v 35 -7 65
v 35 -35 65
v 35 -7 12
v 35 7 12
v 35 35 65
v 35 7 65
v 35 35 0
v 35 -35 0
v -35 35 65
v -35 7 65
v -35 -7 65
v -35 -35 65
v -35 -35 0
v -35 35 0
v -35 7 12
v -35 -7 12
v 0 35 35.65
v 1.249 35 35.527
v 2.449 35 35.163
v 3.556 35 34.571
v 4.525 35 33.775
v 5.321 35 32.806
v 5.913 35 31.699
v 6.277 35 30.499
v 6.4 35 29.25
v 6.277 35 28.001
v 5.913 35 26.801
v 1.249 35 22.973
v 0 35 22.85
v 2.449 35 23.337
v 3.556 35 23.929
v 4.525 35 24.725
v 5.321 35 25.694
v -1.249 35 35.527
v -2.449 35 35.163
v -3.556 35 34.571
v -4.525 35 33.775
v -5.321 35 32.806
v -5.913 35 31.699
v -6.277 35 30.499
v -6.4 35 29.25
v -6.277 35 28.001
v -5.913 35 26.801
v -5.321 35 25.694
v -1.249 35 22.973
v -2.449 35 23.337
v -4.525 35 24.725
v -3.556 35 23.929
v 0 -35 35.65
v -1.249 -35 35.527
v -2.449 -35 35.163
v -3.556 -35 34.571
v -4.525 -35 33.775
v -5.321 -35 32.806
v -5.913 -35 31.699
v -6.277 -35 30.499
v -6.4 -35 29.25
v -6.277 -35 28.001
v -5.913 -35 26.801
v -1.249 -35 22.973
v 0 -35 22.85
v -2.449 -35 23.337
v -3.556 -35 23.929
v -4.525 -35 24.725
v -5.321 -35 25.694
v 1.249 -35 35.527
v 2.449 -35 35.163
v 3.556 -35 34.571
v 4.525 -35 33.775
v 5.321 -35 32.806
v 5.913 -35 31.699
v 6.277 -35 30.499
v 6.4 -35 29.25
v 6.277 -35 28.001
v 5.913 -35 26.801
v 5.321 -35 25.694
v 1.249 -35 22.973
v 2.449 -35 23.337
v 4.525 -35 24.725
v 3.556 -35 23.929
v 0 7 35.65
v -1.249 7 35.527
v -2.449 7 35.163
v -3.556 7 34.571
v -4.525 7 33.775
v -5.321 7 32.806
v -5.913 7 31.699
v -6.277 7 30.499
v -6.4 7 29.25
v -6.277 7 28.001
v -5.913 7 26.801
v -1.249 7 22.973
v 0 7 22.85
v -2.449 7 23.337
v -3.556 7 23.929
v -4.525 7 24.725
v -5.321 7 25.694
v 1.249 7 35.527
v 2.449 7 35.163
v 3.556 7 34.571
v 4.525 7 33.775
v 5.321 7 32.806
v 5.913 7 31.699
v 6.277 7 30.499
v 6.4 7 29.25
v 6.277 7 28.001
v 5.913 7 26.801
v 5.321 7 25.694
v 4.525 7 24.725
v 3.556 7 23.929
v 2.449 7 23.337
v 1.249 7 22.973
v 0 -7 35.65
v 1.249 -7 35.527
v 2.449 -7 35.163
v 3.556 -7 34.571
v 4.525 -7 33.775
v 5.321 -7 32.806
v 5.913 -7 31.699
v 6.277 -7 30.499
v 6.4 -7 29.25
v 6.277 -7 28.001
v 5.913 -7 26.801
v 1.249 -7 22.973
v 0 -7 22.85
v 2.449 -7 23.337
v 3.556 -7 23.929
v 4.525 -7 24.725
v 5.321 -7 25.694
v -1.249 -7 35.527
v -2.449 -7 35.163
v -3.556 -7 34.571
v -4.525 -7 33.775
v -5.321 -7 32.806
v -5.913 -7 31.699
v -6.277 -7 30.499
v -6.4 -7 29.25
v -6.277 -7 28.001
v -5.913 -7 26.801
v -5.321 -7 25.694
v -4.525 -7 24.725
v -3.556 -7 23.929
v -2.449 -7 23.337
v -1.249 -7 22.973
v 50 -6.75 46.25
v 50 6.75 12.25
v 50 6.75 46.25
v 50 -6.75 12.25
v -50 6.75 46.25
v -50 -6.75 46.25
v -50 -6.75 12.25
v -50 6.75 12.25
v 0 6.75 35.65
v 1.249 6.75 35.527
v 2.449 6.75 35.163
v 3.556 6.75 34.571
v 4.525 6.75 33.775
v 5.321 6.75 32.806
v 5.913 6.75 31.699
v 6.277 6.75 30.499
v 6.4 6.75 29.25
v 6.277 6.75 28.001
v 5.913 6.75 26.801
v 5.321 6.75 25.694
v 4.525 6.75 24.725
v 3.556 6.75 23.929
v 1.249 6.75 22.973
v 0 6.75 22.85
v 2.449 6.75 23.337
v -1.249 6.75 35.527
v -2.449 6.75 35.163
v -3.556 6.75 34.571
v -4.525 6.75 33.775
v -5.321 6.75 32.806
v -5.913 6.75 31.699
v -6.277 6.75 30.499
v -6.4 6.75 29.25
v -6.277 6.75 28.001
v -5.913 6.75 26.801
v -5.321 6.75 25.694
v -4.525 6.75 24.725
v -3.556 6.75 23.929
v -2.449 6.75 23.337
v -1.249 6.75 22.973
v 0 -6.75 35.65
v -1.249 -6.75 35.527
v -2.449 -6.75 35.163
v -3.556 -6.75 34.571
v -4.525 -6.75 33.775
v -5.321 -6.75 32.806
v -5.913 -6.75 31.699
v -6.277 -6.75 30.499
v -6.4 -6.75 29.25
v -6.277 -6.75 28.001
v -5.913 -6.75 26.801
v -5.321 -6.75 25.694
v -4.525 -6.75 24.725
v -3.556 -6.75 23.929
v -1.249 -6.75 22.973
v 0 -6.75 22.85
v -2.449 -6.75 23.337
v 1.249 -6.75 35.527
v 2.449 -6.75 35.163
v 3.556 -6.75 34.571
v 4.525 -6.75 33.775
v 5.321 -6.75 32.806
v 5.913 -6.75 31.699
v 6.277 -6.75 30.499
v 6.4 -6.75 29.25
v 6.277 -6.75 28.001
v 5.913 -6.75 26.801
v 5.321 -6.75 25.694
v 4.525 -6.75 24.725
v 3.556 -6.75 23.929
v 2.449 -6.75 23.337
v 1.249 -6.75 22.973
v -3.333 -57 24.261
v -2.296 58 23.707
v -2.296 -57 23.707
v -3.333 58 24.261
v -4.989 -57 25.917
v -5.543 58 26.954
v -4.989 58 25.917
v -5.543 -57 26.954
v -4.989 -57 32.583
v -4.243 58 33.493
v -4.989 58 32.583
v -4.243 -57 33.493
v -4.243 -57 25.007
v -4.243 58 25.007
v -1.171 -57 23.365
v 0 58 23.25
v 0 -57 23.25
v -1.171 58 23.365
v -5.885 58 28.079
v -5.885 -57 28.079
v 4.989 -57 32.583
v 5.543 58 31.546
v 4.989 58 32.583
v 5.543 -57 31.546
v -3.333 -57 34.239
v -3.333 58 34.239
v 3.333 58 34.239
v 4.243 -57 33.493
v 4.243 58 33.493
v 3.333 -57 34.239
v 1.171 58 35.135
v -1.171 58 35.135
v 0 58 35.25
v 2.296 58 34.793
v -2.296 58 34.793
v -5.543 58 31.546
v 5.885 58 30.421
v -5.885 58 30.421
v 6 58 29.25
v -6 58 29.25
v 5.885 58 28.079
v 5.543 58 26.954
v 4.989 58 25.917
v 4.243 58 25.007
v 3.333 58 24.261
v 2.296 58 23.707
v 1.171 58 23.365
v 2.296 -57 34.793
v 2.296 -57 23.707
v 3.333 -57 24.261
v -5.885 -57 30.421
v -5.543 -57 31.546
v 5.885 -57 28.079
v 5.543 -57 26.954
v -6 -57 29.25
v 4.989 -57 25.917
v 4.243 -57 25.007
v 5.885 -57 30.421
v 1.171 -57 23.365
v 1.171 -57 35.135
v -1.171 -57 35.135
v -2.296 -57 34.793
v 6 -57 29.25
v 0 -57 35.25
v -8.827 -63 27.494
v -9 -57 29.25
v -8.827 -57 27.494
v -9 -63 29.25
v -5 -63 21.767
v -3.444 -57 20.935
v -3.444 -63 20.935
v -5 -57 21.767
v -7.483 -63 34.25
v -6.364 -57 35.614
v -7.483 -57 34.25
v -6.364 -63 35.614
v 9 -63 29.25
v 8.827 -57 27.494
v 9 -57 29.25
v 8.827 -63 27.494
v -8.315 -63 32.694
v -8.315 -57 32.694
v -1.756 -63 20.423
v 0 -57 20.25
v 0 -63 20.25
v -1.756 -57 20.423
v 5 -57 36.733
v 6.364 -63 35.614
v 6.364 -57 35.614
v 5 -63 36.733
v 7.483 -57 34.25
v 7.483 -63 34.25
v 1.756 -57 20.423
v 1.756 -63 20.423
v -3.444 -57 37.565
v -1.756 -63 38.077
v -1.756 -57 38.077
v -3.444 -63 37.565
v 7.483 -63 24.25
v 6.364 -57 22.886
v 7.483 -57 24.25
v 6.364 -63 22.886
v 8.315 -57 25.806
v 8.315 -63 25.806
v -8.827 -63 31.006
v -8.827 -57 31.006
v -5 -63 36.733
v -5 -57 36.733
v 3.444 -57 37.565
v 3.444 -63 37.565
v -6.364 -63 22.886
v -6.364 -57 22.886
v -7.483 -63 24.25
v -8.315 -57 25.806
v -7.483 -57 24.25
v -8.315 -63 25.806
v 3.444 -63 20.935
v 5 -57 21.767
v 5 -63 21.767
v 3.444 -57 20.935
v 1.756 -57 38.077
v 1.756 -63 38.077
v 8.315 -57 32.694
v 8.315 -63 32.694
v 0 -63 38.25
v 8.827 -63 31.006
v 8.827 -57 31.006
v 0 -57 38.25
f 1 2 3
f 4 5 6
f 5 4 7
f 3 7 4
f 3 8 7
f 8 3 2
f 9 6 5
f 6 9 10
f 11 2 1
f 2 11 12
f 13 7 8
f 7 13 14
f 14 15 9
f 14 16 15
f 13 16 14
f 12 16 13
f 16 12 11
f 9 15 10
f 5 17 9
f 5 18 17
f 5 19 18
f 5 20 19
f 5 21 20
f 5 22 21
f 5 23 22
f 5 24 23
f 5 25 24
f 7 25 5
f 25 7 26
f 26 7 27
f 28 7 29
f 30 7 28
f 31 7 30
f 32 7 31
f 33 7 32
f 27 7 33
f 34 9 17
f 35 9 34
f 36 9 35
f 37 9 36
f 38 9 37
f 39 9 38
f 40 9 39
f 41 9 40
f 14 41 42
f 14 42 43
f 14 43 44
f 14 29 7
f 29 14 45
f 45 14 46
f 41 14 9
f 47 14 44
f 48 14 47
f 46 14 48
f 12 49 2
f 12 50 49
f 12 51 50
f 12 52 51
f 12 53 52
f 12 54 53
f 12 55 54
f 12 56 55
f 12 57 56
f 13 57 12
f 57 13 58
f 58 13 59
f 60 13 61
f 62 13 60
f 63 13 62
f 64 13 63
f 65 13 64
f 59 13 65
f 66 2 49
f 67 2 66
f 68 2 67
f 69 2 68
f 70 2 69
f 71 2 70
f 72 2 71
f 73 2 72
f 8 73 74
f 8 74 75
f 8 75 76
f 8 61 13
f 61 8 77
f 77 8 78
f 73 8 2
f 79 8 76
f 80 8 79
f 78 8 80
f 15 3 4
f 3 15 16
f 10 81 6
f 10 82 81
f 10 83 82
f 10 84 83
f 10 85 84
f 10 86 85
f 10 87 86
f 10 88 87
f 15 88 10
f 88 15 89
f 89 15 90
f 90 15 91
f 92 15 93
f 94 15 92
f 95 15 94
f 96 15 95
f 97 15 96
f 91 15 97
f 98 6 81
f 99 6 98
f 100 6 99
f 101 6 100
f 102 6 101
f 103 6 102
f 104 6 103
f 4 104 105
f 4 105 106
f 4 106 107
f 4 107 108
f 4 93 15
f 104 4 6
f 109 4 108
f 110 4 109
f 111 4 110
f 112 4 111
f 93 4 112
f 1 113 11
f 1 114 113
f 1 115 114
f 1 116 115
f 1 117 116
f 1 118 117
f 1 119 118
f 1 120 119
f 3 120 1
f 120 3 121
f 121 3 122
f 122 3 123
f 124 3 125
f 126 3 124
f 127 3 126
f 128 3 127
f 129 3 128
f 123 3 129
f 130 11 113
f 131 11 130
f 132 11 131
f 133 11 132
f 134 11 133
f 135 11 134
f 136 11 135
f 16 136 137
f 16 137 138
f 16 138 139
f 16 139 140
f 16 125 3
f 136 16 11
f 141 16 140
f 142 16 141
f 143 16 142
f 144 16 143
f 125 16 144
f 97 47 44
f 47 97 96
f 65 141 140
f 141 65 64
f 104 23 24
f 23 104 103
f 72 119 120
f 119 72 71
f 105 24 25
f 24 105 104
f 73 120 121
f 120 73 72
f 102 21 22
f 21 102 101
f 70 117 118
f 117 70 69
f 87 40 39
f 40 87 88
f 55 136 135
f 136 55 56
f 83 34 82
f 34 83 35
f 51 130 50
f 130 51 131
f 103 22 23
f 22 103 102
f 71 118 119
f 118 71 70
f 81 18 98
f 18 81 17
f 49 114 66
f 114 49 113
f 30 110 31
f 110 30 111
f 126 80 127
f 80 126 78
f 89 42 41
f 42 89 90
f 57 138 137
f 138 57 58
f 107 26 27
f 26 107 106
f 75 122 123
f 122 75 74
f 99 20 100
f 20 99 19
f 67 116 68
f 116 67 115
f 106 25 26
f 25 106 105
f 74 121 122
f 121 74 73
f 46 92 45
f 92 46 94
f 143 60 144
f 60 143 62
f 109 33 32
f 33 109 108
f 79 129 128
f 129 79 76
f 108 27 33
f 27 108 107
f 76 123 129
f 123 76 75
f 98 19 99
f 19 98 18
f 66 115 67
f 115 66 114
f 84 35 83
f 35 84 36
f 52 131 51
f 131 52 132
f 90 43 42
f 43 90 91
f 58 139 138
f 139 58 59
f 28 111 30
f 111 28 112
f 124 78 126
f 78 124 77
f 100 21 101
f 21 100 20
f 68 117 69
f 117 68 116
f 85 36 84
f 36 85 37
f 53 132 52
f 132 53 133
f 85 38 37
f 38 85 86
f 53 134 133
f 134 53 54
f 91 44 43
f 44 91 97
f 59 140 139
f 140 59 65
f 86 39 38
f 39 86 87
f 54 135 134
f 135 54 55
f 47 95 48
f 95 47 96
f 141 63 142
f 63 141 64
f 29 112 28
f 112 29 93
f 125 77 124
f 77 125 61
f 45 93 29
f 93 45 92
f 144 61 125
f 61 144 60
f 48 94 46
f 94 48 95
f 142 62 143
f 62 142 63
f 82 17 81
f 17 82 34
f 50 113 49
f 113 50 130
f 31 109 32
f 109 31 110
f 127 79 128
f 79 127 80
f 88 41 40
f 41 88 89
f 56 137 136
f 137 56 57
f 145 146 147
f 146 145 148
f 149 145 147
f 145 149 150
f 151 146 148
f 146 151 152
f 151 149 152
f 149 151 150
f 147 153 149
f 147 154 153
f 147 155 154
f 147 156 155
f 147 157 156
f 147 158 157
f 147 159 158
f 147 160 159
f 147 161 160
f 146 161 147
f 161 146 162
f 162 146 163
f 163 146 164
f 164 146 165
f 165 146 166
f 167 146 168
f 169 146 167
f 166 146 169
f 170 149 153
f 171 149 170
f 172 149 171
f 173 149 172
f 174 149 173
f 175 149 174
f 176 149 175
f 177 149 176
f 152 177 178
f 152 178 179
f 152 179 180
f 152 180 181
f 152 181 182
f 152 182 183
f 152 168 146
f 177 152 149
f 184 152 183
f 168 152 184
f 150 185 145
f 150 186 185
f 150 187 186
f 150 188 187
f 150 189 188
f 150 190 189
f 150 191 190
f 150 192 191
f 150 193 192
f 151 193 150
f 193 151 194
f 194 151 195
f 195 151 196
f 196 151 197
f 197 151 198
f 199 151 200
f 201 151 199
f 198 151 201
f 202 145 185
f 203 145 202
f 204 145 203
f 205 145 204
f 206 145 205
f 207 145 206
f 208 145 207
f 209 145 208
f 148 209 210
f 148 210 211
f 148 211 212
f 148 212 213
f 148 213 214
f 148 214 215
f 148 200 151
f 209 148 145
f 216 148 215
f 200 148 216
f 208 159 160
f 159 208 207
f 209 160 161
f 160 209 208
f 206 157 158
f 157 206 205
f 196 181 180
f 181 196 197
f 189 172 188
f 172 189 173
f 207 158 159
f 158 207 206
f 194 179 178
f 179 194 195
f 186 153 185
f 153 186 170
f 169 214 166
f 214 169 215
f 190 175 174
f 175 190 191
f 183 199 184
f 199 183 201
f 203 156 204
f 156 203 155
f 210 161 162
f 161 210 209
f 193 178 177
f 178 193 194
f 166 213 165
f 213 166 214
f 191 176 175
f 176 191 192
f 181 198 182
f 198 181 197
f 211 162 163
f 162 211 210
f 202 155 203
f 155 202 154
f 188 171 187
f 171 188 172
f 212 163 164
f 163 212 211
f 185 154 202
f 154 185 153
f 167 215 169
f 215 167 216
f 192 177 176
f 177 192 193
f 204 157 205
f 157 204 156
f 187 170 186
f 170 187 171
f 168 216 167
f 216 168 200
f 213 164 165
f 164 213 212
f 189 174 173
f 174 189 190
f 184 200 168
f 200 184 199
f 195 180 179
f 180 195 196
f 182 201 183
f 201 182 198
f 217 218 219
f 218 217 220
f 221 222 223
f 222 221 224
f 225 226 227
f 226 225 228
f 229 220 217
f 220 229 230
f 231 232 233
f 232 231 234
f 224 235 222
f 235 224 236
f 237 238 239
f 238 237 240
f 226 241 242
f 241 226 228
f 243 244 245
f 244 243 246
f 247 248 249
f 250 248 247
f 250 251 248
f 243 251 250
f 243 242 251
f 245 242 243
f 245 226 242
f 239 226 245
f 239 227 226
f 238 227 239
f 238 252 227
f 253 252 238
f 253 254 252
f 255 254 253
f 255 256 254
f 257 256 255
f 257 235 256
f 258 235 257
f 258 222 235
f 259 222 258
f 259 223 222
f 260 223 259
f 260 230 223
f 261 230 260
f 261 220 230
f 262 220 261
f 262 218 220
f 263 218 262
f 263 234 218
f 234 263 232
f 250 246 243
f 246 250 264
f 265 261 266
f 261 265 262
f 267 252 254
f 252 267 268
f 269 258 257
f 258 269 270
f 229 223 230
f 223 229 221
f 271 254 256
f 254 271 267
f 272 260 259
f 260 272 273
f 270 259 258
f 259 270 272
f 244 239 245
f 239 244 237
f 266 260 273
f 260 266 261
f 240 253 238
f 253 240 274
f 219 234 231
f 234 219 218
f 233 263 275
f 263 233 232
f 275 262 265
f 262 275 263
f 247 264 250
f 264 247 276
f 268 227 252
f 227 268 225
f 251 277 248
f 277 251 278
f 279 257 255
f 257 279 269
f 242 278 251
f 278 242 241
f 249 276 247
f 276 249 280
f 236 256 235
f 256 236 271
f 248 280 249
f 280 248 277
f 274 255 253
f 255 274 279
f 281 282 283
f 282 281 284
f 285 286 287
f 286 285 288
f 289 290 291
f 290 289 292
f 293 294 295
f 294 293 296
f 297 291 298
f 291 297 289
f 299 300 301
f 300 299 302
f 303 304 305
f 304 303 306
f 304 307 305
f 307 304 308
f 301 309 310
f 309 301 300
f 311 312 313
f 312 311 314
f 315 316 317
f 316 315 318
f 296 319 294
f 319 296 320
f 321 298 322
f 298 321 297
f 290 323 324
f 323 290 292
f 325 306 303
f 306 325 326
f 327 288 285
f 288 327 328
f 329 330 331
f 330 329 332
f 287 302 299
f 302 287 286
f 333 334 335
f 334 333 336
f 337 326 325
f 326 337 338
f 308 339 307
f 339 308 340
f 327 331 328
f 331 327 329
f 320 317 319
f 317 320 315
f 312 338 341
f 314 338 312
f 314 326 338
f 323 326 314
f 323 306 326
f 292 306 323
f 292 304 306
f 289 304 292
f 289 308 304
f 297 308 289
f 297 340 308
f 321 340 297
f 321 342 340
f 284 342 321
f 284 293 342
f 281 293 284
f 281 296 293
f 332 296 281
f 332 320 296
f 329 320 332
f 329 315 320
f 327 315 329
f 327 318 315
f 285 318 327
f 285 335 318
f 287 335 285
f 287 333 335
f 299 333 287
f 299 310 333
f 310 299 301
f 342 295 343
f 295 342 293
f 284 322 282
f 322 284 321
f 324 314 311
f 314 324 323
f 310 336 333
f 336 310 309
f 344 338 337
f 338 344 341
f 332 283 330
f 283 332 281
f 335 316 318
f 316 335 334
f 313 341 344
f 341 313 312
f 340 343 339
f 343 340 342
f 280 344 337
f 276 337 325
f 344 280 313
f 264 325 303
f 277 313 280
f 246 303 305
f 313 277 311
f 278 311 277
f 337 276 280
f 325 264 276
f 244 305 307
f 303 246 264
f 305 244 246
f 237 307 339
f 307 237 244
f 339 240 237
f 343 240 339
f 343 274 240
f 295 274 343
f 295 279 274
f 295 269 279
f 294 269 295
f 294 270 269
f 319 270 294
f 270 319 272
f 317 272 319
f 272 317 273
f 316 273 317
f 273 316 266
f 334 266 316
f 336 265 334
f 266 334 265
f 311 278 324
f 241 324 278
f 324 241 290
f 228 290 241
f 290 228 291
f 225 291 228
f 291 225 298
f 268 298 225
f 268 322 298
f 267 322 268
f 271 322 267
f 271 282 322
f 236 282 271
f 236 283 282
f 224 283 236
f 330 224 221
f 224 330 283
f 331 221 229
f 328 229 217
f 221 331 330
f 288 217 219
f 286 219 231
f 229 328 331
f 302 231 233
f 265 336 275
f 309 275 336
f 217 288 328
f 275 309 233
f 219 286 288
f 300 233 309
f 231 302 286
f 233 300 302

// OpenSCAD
$fn = 32;

// ------------------------------------------------------------------------
// Clevis joint: 70 mm clevis, pin d12
// Every part is its own module, assembly() places them once.
// ------------------------------------------------------------------------

// --- part 1 ---
module clevis() {
  difference() {
    translate([-35, -35, 0]) cube([70, 70, 65]);
    translate([-36, -7, 12]) cube([72, 14, 54]);
    translate([0, 0, 29.25]) rotate([90, 0, 0]) cylinder(h = 72, d = 12.8, center = true);
  }
}

// --- part 2 ---
module eye() {
  difference() {
    translate([-50, -6.75, 0]) cube([100, 13.5, 34]);
    translate([0, 0, 17]) rotate([90, 0, 0]) cylinder(h = 15.5, d = 12.8, center = true);
  }
}

// --- part 3 ---
module pin() {
  rotate([0, 90, 0]) cylinder(h = 116, d = 12, center = true);
  translate([-63, 0, 0]) rotate([0, 90, 0]) cylinder(h = 6, d = 18);
}

// --- assembly ---
module assembly() {
  translate([0, 0, 0]) rotate([0, 0, 0]) clevis();
  translate([0, 0, 12.25]) rotate([0, 0, 0]) eye();
  translate([0, 0, 29.25]) rotate([0, 0, 90]) pin();
}

assembly();
